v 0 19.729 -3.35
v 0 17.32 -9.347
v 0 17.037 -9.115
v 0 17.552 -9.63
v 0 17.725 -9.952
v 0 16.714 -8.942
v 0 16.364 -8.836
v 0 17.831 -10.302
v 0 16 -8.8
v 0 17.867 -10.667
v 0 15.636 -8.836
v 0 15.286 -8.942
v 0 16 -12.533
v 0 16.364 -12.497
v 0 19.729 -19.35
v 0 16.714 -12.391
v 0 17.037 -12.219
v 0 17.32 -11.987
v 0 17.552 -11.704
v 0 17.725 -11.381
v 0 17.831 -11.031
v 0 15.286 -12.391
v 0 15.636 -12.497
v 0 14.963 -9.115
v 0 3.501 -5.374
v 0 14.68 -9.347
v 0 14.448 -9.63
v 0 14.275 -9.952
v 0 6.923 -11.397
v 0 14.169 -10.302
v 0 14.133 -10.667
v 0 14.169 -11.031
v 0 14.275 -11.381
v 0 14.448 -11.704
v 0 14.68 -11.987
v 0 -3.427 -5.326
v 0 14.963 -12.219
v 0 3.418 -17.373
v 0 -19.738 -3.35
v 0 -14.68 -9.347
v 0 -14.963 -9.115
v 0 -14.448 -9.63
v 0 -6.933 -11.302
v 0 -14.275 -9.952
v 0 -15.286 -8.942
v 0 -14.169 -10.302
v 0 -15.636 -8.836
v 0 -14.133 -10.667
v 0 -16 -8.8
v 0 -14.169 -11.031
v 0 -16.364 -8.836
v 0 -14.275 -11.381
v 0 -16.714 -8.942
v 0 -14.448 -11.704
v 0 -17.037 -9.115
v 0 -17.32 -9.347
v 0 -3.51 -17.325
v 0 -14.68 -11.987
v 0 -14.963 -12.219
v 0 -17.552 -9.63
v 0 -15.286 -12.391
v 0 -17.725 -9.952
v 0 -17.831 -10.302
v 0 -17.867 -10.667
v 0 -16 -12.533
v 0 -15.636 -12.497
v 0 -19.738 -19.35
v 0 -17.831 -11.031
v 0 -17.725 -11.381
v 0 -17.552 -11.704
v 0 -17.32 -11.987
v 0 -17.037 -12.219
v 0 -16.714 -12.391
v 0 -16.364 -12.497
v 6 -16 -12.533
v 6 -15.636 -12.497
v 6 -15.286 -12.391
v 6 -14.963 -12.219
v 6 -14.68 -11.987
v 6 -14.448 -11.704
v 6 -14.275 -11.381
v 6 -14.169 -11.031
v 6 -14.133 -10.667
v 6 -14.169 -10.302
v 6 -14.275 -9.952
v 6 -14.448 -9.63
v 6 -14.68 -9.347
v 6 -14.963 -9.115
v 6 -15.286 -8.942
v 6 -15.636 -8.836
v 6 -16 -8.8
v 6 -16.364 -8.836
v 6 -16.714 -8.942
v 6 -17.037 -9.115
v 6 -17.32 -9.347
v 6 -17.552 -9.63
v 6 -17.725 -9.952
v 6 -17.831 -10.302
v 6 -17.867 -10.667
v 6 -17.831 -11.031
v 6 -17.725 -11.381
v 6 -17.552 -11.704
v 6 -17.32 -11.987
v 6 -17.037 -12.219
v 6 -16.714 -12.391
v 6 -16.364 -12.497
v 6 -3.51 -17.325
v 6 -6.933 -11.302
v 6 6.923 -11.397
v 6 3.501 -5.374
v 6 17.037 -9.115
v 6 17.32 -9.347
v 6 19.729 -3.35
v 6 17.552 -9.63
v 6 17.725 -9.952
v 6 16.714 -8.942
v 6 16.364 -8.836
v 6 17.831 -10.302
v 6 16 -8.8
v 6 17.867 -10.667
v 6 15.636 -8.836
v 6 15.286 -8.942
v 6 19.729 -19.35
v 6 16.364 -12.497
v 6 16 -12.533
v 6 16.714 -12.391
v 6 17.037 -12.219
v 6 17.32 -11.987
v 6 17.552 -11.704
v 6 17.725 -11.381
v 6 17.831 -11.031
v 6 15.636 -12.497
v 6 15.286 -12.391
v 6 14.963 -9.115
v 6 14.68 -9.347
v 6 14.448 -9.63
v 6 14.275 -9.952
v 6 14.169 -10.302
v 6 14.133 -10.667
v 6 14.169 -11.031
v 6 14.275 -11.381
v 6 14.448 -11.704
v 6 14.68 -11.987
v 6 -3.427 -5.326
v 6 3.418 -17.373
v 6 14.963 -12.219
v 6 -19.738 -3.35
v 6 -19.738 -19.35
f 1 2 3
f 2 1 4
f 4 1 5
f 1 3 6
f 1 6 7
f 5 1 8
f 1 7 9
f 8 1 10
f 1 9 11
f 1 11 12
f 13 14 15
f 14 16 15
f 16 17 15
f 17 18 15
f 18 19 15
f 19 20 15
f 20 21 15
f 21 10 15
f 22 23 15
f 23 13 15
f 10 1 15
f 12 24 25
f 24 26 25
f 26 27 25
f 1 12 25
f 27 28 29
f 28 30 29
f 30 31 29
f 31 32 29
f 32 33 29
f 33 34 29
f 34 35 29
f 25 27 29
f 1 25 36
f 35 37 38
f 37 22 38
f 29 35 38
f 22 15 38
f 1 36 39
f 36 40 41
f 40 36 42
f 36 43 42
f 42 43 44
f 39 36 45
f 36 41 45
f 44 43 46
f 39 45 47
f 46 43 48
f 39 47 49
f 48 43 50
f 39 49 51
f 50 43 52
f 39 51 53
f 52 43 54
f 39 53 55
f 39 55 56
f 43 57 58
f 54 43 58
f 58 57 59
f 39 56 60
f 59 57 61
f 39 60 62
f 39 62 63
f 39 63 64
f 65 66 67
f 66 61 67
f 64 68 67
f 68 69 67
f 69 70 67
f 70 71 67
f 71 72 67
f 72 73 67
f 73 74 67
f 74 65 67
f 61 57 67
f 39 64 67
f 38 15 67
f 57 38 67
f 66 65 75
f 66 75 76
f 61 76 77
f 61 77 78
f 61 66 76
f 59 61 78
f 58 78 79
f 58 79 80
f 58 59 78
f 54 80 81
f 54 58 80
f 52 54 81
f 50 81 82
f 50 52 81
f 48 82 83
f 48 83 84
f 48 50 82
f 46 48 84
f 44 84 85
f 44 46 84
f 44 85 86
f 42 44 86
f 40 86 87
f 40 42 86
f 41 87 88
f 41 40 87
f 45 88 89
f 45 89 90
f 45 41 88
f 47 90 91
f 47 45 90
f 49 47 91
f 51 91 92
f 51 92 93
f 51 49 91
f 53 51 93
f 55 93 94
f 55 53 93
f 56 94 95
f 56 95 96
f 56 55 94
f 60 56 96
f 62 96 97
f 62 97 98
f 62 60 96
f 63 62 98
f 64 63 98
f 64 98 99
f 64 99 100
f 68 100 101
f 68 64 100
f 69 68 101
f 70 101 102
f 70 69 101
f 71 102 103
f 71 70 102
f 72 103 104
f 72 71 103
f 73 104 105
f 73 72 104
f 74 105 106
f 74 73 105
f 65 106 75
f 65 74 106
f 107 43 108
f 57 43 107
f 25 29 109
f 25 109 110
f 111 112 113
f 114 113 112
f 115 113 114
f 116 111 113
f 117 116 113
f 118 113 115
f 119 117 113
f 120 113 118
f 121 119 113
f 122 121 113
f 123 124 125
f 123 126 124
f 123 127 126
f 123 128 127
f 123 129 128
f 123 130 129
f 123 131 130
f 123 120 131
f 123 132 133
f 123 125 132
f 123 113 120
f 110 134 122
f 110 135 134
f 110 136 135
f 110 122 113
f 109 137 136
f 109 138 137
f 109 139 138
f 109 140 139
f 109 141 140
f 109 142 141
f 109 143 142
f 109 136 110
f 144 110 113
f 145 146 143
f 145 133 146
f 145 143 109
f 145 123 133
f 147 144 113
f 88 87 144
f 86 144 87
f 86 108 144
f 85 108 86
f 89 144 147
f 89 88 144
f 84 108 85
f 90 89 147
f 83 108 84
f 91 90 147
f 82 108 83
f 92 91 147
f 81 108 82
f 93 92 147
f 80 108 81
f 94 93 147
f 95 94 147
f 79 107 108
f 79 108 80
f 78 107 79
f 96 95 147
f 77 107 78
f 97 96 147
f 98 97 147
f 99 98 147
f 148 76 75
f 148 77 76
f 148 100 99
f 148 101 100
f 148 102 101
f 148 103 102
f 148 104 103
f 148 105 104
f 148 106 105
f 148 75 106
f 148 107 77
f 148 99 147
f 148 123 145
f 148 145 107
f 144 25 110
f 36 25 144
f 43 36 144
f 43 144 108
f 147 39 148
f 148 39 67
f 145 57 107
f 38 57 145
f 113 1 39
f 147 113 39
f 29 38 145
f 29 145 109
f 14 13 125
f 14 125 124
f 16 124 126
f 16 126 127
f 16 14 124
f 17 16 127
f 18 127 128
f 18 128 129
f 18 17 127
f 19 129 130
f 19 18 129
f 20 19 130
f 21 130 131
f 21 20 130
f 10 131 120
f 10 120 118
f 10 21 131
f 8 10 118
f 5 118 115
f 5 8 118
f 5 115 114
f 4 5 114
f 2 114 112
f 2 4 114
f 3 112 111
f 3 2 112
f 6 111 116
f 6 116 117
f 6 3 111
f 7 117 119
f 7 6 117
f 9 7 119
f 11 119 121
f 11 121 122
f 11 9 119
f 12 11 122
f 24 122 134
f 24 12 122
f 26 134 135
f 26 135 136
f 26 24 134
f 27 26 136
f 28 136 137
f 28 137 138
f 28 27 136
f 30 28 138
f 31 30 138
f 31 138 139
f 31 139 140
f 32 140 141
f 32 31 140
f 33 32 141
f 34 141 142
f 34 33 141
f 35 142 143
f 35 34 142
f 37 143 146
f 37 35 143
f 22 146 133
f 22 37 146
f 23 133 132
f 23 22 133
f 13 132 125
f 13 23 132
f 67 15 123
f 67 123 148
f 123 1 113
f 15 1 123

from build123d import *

# Parameters (mm, degrees)
SKETCH1_W           = 39.466666666
SKETCH1_H           = 16
SKETCH1_R           = 1.866666667
BOSS_EXTRUDE1_DEPTH = 6


with BuildPart() as part:
    # Sketch1 → Boss-Extrude1 (new body)
    with BuildSketch(Plane(origin=(0, 0, 0), x_dir=(0, -1, 0), z_dir=(1, 0, 0))):
        with Locations((0.004714435, 11.349547327)):
            Rectangle(SKETCH1_W, SKETCH1_H)
        with Locations(Location((16, 10.666666667, 0), (0, 0, 90))):
            Circle(SKETCH1_R, mode=Mode.SUBTRACT)
        with Locations(Location((-16, 10.666666667, 0), (0, 0, 90))):
            Circle(SKETCH1_R, mode=Mode.SUBTRACT)
        Polygon((-3.417883139, 17.373319057), (-6.923323696, 11.397376747), (-3.500726123, 5.373605017), (3.427312009, 5.325775598), (6.932752566, 11.301717908), (3.510154993, 17.325489638), align=None, mode=Mode.SUBTRACT)
    extrude(amount=BOSS_EXTRUDE1_DEPTH)


solid = part.part
